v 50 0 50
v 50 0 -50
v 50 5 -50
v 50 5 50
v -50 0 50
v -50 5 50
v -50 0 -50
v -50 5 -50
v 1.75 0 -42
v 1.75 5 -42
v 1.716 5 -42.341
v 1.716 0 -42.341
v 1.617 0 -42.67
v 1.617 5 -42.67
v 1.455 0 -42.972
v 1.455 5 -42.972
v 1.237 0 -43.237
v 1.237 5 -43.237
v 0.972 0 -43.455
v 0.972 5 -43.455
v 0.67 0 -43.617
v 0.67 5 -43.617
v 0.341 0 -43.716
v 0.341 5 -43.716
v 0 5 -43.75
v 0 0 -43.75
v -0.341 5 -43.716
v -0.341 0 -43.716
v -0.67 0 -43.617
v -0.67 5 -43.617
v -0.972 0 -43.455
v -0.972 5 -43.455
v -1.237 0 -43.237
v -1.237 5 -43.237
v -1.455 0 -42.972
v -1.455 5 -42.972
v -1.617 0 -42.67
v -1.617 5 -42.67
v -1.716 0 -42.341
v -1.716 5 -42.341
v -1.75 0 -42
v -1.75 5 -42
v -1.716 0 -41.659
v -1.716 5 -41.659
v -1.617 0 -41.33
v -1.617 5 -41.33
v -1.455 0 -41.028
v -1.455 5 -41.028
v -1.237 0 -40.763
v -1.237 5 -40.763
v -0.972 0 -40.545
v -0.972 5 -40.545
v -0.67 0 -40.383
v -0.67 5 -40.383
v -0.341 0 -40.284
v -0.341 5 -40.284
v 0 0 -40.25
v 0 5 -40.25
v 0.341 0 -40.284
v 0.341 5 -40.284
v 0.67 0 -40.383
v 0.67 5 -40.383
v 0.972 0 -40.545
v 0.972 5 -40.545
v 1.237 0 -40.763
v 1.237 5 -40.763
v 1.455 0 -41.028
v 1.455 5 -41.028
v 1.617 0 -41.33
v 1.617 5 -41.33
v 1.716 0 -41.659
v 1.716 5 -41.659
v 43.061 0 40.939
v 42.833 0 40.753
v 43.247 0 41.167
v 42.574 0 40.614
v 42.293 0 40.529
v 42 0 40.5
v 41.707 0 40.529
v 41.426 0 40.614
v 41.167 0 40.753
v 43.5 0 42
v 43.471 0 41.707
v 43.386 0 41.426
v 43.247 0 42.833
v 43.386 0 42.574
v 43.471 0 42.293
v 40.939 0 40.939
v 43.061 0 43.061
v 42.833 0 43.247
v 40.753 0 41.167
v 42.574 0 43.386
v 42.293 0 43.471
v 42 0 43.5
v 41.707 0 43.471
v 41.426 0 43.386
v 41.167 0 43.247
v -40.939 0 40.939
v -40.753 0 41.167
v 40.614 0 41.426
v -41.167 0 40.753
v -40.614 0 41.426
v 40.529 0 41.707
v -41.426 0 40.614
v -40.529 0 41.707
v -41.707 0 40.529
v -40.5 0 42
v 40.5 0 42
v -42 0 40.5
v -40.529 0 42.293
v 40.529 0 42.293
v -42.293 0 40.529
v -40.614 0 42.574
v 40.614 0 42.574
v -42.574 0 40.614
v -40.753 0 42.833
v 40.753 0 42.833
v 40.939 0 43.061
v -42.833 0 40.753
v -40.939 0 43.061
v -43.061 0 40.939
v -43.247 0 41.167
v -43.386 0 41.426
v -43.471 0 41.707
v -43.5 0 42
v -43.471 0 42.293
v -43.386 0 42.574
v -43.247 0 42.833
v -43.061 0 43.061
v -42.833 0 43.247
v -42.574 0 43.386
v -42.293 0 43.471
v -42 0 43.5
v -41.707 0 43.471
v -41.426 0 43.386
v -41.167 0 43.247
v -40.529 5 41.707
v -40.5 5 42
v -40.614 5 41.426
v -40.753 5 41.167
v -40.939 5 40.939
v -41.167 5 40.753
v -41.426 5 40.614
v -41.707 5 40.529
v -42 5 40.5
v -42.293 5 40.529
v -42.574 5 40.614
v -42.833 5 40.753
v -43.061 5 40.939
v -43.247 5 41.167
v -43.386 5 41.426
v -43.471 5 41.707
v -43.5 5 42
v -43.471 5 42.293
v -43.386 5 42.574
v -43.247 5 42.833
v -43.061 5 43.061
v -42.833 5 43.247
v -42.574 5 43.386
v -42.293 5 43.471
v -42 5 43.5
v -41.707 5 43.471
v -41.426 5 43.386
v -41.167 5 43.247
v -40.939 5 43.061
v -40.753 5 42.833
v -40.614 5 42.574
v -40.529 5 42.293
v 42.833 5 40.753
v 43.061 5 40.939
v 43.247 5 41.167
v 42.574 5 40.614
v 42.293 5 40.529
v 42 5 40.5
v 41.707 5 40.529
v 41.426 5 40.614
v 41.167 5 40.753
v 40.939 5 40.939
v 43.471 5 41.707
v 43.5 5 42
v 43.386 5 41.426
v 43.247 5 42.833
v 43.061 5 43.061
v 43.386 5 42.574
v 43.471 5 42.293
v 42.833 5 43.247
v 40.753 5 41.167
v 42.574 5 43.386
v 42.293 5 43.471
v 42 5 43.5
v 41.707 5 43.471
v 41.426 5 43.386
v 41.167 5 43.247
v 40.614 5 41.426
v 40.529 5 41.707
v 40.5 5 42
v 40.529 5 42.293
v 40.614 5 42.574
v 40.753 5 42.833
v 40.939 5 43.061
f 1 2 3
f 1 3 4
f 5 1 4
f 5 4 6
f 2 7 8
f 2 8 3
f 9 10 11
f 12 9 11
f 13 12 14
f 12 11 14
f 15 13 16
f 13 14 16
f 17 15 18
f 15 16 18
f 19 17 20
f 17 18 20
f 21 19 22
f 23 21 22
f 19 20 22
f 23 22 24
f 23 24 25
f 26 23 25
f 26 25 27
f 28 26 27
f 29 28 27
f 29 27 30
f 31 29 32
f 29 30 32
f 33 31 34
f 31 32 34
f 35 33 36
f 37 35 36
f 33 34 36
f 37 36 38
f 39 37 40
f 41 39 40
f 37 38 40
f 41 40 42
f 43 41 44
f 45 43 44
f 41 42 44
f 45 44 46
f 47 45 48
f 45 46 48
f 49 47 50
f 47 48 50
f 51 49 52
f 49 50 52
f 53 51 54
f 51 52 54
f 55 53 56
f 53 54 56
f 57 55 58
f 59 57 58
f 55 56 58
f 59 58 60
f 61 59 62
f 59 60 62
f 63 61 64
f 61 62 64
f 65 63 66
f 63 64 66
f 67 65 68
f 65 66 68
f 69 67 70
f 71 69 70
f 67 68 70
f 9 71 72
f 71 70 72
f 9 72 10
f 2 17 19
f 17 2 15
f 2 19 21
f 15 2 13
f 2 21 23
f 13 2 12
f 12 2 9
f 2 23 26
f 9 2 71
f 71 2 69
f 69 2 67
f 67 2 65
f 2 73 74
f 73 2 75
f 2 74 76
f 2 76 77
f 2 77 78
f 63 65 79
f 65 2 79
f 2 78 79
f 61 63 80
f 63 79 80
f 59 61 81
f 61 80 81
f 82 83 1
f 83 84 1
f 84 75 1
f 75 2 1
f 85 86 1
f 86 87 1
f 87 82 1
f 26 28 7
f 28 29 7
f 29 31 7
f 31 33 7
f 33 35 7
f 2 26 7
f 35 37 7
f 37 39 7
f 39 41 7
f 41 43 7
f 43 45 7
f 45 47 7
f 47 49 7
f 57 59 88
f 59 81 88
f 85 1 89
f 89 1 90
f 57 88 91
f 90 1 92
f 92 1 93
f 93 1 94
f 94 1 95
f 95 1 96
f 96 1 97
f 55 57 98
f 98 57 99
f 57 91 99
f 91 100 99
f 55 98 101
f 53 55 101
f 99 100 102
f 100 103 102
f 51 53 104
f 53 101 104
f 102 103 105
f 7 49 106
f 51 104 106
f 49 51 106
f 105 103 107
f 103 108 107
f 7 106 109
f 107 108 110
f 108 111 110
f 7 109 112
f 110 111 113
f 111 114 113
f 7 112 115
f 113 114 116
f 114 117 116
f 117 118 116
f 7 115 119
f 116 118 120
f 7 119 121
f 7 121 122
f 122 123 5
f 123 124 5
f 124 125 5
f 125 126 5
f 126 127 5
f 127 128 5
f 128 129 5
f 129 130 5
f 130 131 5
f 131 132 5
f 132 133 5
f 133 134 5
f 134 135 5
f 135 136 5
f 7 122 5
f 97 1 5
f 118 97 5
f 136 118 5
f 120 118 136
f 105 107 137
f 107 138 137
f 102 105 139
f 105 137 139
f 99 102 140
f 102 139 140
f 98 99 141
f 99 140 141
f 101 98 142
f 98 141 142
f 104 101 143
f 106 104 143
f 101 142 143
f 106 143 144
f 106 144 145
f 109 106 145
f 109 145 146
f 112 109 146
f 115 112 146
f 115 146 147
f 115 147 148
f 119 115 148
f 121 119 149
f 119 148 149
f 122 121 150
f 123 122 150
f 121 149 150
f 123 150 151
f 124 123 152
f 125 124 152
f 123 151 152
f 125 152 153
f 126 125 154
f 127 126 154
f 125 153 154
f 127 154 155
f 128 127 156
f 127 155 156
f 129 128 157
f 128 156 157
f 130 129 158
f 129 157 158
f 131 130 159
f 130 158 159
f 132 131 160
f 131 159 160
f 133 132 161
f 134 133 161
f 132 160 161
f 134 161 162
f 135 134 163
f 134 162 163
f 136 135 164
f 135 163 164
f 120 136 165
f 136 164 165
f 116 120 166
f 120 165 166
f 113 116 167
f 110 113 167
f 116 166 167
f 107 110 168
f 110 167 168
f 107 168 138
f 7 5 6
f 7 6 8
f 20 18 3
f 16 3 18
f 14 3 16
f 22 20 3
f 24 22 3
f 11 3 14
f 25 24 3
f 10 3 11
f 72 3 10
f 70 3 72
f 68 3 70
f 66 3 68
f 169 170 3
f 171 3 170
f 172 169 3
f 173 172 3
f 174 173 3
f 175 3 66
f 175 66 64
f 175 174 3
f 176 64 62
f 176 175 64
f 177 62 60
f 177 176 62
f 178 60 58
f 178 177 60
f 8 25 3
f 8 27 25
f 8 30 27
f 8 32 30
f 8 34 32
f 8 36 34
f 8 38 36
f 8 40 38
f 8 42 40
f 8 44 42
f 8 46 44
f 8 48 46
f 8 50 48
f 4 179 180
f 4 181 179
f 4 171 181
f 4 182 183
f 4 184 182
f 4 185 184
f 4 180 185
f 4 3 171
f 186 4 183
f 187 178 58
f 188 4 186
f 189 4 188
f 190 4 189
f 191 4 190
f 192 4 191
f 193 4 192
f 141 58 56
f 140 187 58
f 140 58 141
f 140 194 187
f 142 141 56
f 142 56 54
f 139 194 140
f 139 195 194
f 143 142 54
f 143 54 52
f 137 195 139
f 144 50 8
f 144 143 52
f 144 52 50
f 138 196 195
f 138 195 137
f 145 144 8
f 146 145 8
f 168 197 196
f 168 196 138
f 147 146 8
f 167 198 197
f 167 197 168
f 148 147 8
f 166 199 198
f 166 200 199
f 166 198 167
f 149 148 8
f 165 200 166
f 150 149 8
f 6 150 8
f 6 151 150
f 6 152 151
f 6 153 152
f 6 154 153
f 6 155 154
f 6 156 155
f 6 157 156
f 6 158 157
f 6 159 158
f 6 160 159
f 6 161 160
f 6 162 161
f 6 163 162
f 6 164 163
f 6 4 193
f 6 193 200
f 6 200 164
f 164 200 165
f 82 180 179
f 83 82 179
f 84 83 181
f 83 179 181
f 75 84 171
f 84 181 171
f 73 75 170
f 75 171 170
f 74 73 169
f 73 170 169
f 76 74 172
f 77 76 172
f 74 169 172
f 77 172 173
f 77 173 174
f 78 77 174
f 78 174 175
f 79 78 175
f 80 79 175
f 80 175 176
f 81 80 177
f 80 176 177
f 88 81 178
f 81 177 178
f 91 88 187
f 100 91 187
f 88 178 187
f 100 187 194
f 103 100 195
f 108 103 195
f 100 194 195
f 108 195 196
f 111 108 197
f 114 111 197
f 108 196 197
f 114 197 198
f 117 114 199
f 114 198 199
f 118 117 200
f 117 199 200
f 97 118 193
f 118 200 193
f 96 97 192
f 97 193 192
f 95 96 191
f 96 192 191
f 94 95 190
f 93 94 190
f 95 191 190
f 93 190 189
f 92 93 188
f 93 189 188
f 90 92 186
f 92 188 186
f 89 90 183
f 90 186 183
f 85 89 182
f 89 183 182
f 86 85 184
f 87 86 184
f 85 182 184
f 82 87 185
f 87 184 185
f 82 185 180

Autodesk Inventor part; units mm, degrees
ref_plane "YZ Plane" through (0, 0, 0) normal (1, 0, 0) x (0, 1, 0)
ref_plane "XZ Plane" through (0, 0, 0) normal (0, 1, 0) x (-1, 0, 0)
ref_plane "XY Plane" through (0, 0, 0) normal (0, 0, 1) x (1, 0, 0)
sketch "Sketch1" plane through (0, 0, 0) normal (0, 1, 0) x (-1, 0, 0)
  line L0 (50, -50) -> (-50, -50)
  line L1 (-50, -50) -> (-50, 50)
  line L2 (-50, 50) -> (50, 50)
  line L3 (50, 50) -> (50, -50)
  line L4 (50, -50) -> (-50, 50) construction
  line L5 (-50, -50) -> (50, 50) construction
  point P0 (0, 0)
  dimension "d0" = 100
  dimension "d1" = 100
extrude "Extrusion1" add sketch "Sketch1" along normal blind 5
sketch "Sketch2" plane through (0, 5, 0) normal (0, 1, 0) x (1, 0, 0)
  circle A0 centre (42, 0) radius 4
  circle A1 centre (42, -42) radius 1.5
  circle A2 centre (-42, -42) radius 1.5
  circle A3 centre (-42, 0) radius 4
  circle A4 centre (0, 42) radius 1.75
  line L0 (-50, -50) -> (-50, 50) projected
  line L1 (50, 50) -> (-50, 50) projected
  line L2 (-50, -50) -> (50, -50) projected
  line L3 (50, 50) -> (50, -50) projected
  point P0 (0, 0)
  dimension "d5" = 8
  dimension "d6" = 3
  dimension "d7" = 3
  dimension "d8" = 8
  dimension "d9" = 3.5
  dimension "d12" = 8
  dimension "d13" = 8
  dimension "d14" = 8
  dimension "d15" = 8
  dimension "d16" = 8
  dimension "d17" = 8
  dimension "d22" = 50
  dimension "d23" = 8
extrude "Extrusion2" cut sketch "Sketch2" against normal blind 5 contours A1 | A2 | A4
properties part number "print"
